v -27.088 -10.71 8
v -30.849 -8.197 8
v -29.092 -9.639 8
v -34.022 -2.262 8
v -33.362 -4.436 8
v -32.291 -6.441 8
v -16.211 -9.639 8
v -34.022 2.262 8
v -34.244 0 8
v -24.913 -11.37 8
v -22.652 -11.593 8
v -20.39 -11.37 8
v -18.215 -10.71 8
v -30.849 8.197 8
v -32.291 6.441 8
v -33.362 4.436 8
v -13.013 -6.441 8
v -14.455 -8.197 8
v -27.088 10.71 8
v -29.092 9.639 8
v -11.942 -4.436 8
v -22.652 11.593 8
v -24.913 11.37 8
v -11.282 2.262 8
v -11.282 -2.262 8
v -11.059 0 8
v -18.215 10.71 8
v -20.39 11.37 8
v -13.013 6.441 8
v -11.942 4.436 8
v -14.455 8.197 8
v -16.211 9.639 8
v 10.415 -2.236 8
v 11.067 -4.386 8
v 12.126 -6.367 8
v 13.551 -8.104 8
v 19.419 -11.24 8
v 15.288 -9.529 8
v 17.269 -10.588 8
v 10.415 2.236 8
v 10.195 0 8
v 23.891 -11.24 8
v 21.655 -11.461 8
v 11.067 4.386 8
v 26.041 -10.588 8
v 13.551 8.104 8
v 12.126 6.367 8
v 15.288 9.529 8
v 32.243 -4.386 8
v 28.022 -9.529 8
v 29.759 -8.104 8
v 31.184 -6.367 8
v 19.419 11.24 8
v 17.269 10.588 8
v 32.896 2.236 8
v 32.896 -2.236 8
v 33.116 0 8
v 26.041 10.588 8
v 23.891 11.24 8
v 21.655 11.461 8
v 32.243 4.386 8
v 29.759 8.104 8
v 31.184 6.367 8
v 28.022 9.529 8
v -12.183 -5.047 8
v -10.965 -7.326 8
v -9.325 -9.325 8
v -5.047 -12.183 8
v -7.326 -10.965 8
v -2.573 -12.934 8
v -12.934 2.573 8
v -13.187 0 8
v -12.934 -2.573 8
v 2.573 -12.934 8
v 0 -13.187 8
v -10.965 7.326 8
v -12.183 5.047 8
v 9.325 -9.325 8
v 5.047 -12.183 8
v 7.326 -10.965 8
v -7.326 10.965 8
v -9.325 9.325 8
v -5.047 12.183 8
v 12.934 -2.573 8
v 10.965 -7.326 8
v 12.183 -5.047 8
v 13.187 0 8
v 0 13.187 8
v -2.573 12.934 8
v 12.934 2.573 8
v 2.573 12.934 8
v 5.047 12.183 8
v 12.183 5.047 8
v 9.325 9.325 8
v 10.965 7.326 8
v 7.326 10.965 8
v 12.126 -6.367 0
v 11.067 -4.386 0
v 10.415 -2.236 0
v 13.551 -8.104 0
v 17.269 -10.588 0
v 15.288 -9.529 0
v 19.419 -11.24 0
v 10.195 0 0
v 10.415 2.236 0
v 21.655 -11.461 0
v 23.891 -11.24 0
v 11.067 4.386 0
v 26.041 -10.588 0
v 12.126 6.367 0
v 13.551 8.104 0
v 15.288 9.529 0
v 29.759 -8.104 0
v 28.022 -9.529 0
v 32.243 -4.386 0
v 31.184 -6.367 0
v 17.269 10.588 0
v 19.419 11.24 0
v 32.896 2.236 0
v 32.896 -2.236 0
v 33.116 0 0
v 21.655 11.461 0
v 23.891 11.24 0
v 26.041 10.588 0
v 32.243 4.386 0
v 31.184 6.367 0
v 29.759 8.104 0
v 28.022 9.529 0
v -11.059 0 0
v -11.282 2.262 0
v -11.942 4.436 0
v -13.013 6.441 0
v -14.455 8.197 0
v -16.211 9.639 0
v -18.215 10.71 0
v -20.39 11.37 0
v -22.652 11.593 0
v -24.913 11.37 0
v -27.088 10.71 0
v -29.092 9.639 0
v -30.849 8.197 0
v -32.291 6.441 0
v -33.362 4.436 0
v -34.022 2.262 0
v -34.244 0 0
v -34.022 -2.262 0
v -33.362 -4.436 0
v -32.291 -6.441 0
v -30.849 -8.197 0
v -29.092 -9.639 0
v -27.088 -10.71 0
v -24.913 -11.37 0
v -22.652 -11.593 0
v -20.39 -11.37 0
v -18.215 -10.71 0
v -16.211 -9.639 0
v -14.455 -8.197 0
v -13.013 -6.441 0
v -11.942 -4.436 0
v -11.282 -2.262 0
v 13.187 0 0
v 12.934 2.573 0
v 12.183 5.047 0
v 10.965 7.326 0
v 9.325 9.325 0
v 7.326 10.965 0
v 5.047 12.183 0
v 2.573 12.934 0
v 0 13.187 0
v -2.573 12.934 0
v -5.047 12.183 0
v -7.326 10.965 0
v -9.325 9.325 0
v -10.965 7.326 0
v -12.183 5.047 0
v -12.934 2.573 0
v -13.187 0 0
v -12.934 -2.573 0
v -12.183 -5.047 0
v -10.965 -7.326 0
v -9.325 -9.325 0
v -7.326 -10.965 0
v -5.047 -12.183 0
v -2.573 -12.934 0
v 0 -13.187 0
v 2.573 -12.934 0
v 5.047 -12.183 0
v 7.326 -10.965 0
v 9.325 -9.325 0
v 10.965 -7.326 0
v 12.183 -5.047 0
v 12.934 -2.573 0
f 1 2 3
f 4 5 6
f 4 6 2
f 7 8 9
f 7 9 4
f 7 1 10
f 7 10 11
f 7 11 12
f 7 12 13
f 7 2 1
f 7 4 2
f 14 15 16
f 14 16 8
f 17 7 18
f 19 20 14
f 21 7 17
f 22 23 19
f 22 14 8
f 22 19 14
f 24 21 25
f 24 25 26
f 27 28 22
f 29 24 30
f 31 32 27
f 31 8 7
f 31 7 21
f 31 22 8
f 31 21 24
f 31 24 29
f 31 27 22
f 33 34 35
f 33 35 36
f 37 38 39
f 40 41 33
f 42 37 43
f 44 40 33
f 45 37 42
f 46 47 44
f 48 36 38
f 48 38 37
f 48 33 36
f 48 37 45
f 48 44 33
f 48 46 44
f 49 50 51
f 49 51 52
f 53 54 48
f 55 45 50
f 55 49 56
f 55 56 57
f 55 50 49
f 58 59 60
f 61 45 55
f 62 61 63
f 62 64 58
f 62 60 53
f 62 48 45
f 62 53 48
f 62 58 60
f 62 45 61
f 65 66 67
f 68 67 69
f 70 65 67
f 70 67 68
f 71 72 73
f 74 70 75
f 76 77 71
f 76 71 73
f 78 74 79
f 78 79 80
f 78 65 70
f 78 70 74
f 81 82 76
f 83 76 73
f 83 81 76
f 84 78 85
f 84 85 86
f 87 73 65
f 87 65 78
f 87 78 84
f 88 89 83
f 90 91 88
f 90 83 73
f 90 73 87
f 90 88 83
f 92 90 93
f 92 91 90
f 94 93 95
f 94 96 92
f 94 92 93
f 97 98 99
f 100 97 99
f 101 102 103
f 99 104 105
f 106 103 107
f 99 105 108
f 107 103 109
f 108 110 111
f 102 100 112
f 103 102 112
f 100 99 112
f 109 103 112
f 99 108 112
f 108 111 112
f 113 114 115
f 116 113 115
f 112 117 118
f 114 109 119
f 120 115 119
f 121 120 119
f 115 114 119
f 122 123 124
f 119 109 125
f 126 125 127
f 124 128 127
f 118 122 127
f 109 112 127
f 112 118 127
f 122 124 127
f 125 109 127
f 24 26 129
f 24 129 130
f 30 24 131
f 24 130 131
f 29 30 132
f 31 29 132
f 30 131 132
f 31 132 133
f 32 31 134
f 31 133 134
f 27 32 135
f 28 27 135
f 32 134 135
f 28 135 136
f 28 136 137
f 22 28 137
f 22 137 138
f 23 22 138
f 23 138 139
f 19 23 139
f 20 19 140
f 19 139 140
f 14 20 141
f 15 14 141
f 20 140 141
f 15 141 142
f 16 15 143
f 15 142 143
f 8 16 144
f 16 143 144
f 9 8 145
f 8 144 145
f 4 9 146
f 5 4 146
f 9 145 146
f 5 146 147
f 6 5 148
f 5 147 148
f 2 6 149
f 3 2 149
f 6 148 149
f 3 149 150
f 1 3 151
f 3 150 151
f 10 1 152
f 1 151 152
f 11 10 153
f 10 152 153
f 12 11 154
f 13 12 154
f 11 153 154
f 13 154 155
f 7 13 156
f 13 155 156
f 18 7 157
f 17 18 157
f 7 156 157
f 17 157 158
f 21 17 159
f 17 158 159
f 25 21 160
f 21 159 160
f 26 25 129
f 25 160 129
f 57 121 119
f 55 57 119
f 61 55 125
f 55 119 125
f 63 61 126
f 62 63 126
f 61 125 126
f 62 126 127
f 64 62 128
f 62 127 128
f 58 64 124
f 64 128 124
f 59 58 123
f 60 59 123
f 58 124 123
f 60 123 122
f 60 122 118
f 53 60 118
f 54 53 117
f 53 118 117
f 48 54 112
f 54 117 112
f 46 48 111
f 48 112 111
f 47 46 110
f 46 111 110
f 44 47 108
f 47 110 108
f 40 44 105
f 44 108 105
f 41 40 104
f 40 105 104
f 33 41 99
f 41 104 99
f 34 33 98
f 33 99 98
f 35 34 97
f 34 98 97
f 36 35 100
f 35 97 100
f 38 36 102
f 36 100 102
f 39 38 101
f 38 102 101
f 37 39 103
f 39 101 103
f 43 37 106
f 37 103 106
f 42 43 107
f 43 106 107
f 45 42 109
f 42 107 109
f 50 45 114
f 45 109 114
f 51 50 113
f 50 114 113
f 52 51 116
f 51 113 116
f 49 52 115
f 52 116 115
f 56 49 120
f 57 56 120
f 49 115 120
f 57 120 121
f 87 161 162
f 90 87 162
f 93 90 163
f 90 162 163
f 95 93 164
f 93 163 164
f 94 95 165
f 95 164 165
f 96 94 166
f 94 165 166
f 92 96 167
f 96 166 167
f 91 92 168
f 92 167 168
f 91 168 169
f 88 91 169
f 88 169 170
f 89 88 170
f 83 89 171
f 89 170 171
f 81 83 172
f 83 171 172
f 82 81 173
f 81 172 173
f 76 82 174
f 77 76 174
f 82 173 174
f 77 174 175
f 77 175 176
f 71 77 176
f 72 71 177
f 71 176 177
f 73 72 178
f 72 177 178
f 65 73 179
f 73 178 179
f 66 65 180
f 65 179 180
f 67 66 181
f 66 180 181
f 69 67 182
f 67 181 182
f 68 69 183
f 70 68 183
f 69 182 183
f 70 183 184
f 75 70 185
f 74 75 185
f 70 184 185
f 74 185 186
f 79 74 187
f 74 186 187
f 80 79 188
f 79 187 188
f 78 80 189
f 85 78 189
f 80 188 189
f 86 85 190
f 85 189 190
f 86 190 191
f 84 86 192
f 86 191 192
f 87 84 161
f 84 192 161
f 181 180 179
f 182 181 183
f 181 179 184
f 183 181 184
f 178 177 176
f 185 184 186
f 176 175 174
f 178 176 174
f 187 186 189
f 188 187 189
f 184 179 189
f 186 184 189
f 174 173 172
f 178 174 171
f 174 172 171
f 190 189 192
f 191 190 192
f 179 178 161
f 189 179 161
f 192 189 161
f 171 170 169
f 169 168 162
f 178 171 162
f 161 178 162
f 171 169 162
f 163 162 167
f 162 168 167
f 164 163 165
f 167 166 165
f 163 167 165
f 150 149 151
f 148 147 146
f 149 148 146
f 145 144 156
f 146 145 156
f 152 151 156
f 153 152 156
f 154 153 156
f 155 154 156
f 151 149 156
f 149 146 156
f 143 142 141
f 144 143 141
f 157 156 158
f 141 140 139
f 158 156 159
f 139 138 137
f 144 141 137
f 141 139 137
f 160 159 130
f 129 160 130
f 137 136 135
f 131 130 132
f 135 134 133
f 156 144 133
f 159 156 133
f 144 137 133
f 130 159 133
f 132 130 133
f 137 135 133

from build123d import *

# Parameters (mm, degrees)
F1_R     = 11.5926936957
F2_DEPTH = 8
F1_R_2   = 11.4606190987
F0_R     = 13.1872869675


with BuildPart() as f2:
    # F1 (on face) → F2 (new body)
    with BuildSketch(Plane.XY):
        with Locations((-22.6517971605, 0)):
            Circle(F1_R)
    extrude(amount=F2_DEPTH)


with BuildPart() as f2b:
    # F1 (on face) → F2, piece 2 (new body)
    with BuildSketch(Plane.XY):
        with Locations((21.6551497579, 0)):
            Circle(F1_R_2)
    extrude(amount=F2_DEPTH)


with BuildPart() as f2c:
    # F0 (on Top) → F2, piece 3 (new body)
    with BuildSketch(Plane.XY):
        Circle(F0_R)
    extrude(amount=F2_DEPTH)


solid = Compound([f2.part, f2b.part, f2c.part])
